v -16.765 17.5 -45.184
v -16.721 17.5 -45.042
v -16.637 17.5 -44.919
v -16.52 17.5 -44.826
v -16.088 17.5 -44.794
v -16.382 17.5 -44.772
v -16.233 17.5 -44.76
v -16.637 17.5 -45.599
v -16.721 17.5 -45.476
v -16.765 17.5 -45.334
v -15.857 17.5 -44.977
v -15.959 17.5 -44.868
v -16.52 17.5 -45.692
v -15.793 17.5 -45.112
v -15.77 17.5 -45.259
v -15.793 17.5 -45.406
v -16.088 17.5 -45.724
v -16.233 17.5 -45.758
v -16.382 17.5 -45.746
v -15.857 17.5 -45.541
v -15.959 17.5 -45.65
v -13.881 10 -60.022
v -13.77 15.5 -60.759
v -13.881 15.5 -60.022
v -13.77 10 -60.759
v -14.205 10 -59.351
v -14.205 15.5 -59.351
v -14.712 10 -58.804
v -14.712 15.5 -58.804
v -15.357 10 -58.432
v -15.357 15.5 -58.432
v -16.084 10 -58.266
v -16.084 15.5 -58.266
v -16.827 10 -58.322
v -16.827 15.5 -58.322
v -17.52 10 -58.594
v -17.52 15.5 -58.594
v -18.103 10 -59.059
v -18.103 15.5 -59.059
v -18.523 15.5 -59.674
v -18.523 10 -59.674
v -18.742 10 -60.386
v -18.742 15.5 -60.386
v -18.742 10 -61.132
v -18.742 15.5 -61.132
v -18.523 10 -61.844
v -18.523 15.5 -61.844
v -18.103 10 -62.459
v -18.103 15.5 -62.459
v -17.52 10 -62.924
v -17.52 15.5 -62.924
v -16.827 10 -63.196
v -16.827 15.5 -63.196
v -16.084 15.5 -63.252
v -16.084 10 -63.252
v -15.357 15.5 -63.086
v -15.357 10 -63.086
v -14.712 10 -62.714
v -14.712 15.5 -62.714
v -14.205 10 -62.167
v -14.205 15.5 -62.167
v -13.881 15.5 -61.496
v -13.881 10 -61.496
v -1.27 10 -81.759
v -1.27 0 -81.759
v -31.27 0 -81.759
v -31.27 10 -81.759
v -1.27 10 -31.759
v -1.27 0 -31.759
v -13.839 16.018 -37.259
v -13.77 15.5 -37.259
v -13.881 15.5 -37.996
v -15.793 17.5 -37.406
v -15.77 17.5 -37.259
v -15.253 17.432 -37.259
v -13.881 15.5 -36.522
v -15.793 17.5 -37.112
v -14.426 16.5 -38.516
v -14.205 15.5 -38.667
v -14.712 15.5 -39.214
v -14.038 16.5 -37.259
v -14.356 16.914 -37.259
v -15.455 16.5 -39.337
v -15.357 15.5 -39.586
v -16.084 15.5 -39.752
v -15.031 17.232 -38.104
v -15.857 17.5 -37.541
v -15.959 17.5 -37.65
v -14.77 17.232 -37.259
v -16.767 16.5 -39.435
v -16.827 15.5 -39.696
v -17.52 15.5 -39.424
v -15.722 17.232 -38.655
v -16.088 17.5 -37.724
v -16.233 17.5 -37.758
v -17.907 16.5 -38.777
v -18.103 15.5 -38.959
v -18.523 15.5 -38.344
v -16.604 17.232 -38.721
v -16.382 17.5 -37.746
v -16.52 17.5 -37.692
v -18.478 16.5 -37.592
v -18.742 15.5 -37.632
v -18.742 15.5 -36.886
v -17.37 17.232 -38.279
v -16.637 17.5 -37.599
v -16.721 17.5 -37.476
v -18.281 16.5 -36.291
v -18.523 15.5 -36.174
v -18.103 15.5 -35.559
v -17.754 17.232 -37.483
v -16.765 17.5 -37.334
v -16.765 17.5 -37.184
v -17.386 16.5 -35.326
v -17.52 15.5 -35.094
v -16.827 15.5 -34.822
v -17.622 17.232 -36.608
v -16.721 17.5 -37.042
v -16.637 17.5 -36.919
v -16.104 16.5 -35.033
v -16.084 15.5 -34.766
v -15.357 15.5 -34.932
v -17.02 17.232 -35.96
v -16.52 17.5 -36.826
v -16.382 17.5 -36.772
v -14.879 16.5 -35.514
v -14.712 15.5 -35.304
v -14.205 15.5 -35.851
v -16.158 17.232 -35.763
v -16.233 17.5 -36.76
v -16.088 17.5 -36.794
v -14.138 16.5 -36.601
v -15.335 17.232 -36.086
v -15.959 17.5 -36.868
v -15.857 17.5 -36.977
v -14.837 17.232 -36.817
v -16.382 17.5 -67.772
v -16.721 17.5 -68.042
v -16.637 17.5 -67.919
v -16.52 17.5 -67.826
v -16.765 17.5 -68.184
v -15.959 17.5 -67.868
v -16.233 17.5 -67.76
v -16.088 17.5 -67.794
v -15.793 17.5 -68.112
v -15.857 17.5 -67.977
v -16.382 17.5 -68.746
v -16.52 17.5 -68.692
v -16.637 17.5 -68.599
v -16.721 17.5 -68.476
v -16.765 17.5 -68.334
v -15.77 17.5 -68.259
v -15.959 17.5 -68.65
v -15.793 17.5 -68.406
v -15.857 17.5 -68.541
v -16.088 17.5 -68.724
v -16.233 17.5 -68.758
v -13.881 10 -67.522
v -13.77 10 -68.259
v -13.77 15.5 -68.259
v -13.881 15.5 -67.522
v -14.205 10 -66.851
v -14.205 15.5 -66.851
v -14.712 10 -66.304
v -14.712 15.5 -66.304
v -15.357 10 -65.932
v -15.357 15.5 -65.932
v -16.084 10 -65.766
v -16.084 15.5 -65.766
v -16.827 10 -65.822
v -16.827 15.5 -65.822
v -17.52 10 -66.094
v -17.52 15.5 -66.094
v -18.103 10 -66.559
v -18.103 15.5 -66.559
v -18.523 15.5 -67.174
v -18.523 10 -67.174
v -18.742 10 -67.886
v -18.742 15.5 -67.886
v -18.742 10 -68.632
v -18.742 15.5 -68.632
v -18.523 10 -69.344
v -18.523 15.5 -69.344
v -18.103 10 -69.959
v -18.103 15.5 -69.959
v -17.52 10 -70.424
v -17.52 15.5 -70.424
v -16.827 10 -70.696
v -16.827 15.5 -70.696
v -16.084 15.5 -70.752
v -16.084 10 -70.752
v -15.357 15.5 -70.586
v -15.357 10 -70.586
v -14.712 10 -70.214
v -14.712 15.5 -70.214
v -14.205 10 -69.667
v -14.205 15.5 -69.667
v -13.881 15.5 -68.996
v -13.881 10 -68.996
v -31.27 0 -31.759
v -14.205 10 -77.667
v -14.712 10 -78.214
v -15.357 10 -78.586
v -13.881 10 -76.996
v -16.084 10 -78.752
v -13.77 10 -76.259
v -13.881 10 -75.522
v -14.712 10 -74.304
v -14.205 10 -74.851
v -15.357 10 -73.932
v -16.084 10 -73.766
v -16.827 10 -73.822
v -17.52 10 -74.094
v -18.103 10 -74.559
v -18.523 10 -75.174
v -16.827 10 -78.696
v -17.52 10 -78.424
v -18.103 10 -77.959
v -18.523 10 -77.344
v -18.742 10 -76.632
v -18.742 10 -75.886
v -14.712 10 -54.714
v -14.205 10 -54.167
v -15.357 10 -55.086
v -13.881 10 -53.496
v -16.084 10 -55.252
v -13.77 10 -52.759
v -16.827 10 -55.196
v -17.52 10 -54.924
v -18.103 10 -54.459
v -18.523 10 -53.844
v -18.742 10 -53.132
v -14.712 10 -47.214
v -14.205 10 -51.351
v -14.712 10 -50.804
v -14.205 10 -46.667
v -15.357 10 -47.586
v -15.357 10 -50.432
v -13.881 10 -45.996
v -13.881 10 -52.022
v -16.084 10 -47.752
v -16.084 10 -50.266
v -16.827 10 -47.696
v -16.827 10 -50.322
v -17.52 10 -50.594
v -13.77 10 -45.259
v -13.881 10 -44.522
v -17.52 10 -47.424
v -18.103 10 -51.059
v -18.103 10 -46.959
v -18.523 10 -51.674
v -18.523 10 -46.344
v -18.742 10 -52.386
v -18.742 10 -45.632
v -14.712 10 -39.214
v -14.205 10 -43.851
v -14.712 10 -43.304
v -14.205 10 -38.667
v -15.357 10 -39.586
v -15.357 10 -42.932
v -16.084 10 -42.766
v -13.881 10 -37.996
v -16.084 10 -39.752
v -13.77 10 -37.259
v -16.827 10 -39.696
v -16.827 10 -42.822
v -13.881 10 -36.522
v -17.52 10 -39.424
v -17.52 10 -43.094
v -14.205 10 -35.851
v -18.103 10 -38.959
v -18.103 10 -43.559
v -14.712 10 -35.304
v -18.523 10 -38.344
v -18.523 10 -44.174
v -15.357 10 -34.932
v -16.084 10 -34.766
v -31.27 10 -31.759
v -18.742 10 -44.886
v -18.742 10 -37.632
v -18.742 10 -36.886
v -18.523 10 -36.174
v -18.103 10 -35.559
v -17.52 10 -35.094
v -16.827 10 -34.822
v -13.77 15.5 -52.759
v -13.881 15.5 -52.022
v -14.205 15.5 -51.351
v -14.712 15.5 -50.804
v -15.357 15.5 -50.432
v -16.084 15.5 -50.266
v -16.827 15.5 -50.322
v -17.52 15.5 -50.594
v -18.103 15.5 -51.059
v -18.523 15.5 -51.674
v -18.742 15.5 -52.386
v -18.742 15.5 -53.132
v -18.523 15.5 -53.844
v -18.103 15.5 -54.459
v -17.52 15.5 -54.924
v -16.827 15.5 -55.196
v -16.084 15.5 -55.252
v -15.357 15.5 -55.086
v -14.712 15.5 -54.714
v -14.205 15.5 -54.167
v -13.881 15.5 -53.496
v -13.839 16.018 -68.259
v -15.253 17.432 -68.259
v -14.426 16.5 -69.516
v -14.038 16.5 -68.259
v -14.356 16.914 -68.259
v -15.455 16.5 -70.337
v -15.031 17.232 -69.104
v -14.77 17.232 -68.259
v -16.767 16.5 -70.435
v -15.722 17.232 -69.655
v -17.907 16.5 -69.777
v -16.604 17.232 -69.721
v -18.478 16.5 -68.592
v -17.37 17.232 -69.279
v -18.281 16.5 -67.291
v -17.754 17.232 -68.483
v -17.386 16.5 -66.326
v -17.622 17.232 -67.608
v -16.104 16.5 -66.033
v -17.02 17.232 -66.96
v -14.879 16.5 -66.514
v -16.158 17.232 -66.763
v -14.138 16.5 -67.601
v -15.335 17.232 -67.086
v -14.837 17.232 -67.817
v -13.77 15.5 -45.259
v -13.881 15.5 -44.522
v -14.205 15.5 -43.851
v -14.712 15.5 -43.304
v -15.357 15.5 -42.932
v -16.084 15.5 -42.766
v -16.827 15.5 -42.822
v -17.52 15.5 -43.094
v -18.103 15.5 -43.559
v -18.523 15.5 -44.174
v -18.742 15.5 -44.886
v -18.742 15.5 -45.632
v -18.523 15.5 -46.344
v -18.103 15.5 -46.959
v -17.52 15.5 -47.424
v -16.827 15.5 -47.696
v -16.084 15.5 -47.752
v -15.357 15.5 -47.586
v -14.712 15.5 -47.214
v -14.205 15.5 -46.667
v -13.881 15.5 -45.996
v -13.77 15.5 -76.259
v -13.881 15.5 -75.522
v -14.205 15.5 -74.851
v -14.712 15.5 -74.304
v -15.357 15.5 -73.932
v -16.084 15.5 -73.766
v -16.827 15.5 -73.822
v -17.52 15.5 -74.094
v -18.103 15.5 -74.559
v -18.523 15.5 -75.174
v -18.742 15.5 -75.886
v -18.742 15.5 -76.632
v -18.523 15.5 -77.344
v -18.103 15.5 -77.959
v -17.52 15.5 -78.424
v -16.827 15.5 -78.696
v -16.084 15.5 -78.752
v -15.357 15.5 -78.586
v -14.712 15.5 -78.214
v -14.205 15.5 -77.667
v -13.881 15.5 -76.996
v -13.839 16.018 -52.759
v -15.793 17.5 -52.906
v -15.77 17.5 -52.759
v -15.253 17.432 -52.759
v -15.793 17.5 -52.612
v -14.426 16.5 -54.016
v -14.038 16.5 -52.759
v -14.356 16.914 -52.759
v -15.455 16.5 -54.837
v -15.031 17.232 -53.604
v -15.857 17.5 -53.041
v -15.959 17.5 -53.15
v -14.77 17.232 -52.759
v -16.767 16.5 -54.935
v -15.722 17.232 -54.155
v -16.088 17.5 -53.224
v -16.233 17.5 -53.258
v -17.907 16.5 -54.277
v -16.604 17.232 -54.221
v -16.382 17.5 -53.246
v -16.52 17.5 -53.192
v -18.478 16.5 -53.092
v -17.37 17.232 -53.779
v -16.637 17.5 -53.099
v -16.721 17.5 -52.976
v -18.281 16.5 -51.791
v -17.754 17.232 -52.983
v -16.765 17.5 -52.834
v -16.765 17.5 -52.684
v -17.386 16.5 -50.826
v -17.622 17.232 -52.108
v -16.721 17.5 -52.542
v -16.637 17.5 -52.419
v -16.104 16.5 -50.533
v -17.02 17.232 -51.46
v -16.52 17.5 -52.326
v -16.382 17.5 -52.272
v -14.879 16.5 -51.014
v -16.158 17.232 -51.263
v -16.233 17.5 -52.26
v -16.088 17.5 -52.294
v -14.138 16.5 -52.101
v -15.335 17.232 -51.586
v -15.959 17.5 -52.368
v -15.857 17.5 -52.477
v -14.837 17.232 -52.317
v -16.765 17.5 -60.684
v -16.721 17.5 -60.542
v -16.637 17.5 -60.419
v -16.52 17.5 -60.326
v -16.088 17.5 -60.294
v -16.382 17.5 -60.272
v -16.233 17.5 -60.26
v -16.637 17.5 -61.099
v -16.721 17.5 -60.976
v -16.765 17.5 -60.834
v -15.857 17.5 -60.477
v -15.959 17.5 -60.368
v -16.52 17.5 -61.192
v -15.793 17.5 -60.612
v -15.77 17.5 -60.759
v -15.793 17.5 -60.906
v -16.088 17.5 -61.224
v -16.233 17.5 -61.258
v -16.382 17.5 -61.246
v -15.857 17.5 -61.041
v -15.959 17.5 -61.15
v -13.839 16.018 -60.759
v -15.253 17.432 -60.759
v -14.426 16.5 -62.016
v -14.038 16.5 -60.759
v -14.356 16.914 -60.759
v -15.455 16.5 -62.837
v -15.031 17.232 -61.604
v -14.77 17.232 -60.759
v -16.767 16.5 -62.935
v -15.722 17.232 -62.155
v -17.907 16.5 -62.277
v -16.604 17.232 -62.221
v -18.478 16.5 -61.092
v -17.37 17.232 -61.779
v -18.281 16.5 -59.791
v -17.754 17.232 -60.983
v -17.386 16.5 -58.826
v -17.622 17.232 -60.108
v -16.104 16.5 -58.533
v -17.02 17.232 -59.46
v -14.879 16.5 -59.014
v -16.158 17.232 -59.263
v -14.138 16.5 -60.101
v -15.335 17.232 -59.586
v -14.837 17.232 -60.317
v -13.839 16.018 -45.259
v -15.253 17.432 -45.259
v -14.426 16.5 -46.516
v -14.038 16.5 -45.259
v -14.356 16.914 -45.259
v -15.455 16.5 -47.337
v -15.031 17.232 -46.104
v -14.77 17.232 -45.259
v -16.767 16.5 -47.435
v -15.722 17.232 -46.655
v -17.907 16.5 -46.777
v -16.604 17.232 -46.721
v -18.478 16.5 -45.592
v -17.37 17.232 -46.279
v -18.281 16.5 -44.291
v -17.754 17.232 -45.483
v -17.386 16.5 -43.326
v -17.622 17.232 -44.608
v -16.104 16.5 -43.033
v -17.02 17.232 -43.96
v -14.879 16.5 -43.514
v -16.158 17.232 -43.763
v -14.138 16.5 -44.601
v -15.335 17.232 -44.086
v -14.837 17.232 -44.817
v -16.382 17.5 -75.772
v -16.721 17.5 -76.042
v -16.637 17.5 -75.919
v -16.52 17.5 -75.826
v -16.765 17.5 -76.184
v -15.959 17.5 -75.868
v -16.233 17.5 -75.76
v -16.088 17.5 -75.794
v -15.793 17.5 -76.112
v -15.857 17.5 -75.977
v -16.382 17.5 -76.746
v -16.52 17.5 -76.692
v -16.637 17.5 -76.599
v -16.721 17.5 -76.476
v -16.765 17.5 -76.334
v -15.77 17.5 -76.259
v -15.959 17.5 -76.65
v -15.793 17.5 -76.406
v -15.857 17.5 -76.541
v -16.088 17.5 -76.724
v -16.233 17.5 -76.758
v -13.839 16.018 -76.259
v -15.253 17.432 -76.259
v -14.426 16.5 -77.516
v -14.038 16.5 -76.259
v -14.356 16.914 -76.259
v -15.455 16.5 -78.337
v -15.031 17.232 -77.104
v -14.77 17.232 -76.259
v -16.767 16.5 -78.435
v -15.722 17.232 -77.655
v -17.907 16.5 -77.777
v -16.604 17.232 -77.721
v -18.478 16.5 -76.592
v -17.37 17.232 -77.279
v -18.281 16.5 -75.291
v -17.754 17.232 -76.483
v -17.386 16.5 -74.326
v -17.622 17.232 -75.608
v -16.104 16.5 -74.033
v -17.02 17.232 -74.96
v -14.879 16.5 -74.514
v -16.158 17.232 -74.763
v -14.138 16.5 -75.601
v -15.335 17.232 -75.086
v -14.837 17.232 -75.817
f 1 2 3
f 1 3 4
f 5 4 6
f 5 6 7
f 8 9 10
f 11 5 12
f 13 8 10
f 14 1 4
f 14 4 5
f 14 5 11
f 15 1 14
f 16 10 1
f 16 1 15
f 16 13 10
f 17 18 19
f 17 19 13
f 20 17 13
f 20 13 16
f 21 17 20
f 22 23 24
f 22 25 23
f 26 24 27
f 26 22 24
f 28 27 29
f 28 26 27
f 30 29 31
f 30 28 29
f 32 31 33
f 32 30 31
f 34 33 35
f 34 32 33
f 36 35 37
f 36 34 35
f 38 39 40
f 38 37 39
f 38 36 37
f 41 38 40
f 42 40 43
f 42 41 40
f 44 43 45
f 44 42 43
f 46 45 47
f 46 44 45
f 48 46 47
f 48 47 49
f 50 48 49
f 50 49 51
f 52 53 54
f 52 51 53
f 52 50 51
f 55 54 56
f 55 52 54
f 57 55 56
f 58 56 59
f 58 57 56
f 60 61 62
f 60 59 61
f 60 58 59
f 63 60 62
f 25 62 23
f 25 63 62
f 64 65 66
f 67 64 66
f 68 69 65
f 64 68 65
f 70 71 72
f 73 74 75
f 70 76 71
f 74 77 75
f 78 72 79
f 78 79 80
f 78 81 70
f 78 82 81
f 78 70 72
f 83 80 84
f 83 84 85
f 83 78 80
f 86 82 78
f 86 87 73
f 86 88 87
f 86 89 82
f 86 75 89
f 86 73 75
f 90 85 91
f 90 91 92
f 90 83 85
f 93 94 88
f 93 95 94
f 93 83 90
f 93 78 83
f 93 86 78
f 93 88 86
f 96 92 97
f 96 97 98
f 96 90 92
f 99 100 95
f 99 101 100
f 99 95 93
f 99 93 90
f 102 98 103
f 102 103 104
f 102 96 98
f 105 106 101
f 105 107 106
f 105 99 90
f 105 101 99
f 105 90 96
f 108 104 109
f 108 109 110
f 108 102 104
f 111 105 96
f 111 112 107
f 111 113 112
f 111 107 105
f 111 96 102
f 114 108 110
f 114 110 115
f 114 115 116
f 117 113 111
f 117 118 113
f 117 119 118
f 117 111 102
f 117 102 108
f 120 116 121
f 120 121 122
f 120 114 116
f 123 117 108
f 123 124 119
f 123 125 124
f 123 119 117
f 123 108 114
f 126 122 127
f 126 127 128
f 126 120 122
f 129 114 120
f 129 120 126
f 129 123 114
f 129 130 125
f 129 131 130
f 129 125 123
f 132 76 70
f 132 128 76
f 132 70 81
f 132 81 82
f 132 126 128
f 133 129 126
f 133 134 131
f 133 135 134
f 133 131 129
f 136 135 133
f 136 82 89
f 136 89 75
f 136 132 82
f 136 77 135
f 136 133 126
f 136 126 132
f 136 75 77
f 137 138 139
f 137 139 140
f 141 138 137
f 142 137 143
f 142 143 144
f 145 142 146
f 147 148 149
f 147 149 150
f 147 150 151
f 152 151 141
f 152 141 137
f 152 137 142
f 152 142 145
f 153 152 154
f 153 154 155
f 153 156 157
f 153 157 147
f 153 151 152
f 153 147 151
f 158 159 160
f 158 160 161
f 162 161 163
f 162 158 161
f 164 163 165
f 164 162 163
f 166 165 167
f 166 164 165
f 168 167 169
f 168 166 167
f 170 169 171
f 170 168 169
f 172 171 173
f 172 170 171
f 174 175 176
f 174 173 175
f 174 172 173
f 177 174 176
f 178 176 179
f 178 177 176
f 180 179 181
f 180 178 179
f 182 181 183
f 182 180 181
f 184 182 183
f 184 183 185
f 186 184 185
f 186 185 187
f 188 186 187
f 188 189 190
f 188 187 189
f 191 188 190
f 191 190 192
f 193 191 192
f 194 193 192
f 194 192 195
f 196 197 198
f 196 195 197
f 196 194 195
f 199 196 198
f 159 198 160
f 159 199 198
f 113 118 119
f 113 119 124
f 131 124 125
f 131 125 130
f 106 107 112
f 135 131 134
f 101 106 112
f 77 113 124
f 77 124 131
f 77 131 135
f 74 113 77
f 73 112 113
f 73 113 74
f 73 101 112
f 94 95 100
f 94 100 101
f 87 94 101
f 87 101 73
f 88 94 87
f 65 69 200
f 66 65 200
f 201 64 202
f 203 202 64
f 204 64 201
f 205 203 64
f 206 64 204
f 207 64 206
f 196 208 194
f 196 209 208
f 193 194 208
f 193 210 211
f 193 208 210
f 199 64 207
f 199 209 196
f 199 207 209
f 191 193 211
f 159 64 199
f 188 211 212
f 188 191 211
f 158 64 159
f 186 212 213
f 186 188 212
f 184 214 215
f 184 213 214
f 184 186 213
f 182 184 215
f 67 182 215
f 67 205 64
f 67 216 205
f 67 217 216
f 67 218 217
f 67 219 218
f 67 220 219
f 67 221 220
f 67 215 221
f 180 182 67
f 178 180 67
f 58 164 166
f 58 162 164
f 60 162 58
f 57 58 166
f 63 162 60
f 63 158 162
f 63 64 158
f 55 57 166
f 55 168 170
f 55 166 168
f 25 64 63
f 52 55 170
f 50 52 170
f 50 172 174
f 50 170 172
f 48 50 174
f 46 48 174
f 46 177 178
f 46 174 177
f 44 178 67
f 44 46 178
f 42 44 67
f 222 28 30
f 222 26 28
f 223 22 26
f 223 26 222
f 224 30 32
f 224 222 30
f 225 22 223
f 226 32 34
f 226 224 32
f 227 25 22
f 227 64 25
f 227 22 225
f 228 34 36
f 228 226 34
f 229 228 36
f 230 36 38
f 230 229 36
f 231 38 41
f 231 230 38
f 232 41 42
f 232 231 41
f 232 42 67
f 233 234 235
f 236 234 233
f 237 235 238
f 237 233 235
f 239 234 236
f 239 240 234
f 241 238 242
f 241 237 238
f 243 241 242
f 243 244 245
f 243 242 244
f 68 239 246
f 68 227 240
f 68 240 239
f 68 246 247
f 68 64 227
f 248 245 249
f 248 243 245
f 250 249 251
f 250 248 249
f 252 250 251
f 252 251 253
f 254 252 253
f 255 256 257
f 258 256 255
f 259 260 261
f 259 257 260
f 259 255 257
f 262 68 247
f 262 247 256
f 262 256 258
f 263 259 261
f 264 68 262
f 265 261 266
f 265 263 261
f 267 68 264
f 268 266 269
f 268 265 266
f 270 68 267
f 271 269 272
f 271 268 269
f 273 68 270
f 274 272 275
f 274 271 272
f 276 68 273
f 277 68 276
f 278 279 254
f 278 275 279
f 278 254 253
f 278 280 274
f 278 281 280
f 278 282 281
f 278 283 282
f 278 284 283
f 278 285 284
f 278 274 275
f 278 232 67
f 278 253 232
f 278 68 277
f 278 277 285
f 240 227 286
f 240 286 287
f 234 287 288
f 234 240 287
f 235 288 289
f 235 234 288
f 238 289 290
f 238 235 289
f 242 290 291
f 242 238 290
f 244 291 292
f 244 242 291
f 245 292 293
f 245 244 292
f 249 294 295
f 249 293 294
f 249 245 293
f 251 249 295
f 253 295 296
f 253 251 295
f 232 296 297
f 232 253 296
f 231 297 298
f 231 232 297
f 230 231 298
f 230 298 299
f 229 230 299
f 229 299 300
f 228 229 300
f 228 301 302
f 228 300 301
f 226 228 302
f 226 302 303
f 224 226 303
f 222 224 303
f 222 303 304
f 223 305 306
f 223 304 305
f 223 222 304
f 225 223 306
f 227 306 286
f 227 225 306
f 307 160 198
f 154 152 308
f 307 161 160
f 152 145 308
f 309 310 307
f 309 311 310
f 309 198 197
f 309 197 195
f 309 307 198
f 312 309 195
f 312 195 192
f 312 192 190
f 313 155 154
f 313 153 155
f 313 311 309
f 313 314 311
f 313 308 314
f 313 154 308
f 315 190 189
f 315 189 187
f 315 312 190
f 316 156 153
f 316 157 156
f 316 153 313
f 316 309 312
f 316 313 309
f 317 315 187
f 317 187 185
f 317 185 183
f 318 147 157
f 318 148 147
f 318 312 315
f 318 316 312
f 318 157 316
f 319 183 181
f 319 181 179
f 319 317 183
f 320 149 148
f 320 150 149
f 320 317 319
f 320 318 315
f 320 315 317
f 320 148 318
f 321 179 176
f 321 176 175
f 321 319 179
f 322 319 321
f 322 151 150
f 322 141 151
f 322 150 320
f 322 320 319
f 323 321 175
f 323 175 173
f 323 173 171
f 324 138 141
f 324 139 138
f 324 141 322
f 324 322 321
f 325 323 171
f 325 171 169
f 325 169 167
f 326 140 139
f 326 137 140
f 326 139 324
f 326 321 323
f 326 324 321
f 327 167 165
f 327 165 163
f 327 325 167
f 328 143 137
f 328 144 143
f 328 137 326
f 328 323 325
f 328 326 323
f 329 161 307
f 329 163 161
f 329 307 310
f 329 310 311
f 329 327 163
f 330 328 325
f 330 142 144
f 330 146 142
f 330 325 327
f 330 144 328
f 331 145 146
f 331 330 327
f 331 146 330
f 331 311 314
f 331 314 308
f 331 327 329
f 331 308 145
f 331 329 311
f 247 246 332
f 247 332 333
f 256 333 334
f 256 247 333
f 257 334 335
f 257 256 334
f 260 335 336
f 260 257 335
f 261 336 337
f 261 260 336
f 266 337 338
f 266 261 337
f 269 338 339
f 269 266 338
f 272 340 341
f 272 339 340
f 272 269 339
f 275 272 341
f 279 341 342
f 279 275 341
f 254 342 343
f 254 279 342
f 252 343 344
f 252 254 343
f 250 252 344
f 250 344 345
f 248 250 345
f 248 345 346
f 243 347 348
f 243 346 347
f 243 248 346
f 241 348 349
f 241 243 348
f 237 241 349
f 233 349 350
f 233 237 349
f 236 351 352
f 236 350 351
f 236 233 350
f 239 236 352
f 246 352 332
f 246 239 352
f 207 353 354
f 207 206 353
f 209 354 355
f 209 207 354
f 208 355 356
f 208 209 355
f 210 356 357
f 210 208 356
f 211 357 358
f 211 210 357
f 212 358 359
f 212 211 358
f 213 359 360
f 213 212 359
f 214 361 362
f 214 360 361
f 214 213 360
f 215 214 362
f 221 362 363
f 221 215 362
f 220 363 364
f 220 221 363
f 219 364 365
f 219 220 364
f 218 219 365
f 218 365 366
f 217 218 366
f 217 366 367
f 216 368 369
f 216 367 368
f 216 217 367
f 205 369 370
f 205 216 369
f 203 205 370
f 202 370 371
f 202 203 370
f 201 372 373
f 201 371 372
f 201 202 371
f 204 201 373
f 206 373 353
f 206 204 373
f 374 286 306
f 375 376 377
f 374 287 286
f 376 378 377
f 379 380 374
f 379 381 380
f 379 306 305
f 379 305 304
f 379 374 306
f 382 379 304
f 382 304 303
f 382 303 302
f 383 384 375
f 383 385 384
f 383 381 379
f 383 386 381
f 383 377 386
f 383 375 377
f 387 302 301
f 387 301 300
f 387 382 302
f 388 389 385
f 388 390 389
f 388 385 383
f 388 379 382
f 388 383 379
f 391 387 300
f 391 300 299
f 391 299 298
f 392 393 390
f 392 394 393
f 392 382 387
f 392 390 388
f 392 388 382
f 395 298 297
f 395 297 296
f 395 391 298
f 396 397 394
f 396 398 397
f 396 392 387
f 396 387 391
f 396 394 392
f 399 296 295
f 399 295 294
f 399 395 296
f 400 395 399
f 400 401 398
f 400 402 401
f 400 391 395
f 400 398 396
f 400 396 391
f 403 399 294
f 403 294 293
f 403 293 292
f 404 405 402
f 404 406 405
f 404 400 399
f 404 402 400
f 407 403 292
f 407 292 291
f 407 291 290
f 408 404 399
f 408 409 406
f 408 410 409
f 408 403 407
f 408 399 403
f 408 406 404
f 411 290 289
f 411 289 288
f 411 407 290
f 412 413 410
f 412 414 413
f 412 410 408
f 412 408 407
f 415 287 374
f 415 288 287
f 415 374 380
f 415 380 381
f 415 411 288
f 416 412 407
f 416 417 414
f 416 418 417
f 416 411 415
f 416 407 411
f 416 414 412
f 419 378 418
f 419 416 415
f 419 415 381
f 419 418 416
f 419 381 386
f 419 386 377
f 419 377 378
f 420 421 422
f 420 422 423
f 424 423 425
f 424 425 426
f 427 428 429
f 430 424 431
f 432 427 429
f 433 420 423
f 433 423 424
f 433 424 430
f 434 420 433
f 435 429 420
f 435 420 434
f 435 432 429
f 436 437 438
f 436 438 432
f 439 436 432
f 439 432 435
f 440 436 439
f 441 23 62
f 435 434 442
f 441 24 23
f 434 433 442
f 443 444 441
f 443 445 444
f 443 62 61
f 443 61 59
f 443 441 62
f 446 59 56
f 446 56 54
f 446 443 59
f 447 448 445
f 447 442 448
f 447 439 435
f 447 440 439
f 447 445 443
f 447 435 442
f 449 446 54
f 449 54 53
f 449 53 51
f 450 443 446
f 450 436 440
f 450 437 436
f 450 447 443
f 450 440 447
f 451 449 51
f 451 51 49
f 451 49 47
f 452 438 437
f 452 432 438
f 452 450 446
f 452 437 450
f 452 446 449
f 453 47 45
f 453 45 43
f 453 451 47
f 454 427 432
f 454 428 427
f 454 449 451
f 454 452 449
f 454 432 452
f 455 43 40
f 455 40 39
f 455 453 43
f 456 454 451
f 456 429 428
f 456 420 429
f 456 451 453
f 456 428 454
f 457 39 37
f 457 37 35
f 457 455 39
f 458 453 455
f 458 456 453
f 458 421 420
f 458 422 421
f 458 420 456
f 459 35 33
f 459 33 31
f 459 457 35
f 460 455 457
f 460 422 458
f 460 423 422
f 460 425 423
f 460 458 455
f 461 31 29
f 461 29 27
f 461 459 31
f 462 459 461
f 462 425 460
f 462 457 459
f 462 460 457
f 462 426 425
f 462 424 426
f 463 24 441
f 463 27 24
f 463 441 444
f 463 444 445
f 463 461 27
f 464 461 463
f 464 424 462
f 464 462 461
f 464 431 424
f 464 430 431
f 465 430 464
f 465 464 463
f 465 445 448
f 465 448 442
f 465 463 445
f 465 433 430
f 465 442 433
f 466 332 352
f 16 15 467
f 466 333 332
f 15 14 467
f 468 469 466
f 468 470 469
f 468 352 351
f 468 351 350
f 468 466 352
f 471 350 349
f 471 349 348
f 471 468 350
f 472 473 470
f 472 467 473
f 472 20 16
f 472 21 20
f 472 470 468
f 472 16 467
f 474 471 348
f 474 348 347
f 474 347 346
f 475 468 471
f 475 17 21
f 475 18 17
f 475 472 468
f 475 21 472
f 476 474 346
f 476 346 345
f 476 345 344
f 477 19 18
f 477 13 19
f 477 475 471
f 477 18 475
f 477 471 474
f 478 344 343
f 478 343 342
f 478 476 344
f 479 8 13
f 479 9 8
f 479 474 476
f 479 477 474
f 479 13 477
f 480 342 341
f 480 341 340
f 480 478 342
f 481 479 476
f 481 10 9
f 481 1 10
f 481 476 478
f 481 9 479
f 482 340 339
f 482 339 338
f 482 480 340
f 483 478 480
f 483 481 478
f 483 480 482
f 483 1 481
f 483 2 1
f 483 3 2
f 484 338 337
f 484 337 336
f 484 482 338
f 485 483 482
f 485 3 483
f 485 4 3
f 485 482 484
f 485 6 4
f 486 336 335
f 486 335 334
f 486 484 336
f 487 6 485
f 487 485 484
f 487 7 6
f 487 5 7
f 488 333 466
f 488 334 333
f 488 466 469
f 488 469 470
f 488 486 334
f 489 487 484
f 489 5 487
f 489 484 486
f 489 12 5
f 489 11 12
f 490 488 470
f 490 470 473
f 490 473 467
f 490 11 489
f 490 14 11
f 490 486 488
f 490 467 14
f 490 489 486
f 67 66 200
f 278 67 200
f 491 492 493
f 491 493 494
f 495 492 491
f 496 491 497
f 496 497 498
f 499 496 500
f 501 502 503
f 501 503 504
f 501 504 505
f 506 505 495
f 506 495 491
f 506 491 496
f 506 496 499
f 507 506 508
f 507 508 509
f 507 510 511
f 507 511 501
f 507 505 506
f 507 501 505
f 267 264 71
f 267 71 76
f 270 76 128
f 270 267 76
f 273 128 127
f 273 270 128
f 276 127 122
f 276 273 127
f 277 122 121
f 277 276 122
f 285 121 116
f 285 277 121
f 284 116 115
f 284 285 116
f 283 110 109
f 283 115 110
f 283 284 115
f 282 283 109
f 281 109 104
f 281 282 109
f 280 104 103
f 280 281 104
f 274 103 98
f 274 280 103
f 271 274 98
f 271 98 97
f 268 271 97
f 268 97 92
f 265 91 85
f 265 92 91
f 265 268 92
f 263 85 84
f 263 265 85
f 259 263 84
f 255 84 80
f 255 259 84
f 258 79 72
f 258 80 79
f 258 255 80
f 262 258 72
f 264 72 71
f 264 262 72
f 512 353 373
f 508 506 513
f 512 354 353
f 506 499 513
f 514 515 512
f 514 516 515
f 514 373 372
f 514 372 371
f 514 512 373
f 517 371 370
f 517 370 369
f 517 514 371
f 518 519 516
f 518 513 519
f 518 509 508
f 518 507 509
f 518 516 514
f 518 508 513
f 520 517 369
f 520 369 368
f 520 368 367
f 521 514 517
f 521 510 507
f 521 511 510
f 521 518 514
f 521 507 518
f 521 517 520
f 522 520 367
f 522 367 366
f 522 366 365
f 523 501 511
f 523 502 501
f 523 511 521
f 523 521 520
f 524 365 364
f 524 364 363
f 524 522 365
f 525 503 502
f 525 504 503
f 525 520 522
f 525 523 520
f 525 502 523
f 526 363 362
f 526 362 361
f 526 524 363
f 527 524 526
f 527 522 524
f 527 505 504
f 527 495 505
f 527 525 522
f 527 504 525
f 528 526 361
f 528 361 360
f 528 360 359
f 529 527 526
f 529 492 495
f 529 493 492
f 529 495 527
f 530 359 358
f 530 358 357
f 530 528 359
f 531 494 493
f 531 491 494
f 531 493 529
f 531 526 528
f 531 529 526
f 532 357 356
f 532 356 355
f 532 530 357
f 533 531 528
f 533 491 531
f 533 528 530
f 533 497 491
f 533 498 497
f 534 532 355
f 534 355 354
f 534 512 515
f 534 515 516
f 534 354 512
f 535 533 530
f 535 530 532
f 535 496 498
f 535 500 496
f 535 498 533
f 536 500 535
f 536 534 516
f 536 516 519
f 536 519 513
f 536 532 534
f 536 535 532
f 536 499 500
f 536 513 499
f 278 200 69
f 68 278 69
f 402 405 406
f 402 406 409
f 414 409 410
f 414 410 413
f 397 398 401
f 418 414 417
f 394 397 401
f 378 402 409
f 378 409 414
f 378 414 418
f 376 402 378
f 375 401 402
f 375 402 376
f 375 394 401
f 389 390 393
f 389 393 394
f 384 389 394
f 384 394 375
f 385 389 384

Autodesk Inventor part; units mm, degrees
ref_plane "YZ Plane" through (0, 0, 0) normal (1, 0, 0) x (0, 1, 0)
ref_plane "XZ Plane" through (0, 0, 0) normal (0, 1, 0) x (-1, 0, 0)
ref_plane "XY Plane" through (0, 0, 0) normal (0, 0, 1) x (1, 0, 0)
sketch "Skizze1" plane through (0, 0, 0) normal (0, 1, 0) x (-1, 0, 0)
  line L0 (31.2704, -31.759) -> (1.2704, -31.759)
  line L1 (1.2704, -31.759) -> (1.2704, -81.759)
  line L2 (1.2704, -81.759) -> (31.2704, -81.759)
  line L3 (31.2704, -81.759) -> (31.2704, -31.759)
  point P0 (0, 0)
  dimension "d0" = 50
  dimension "d1" = 30
extrude "Extrusion1" add sketch "Skizze1" along normal blind 10
sketch "Skizze2" plane through (0, 10, 0) normal (0, 1, 0) x (1, 0, 0)
  circle A0 centre (-16.2704, 37.259) radius 2.5
  circle A1 centre (-16.2704, 60.759) radius 2.5
  circle A2 centre (-16.2704, 76.259) radius 2.5
  circle A3 centre (-16.2704, 45.259) radius 2.5
  circle A4 centre (-16.2704, 52.759) radius 2.5
  circle A5 centre (-16.2704, 68.259) radius 2.5
  line L0 (-31.2704, 81.759) -> (-31.2704, 31.759) projected
  line L1 (-31.2704, 31.759) -> (-1.2704, 31.759) projected
  line L2 (-1.2704, 81.759) -> (-31.2704, 81.759) projected
  point P0 (0, 0)
  dimension "d4" = 5
  dimension "d5" = 5
  dimension "d6" = 5
  dimension "d7" = 5
  dimension "d10" = 5
  dimension "d11" = 5
  dimension "d12" = 15
  dimension "d13" = 15
  dimension "d14" = 15
  dimension "d15" = 15
  dimension "d16" = 15
  dimension "d17" = 15
  dimension "d18" = 8
  dimension "d19" = 8
  dimension "d20" = 8
  dimension "d22" = 5.5
  dimension "d23" = 5.5
  dimension "d24" = 21
extrude "Extrusion2" add sketch "Skizze2" along normal blind 7.5
fillet "Rundung1" radius 2 6 edges at (-18.7704, 17.5, -37.259) (-18.7704, 17.5, -45.259) (-18.7704, 17.5, -52.759) (-18.7704, 17.5, -60.759) (-18.7704, 17.5, -68.259) (-18.7704, 17.5, -76.259)
properties part number "Linien-Sensor" material "Nylon 6/6"
